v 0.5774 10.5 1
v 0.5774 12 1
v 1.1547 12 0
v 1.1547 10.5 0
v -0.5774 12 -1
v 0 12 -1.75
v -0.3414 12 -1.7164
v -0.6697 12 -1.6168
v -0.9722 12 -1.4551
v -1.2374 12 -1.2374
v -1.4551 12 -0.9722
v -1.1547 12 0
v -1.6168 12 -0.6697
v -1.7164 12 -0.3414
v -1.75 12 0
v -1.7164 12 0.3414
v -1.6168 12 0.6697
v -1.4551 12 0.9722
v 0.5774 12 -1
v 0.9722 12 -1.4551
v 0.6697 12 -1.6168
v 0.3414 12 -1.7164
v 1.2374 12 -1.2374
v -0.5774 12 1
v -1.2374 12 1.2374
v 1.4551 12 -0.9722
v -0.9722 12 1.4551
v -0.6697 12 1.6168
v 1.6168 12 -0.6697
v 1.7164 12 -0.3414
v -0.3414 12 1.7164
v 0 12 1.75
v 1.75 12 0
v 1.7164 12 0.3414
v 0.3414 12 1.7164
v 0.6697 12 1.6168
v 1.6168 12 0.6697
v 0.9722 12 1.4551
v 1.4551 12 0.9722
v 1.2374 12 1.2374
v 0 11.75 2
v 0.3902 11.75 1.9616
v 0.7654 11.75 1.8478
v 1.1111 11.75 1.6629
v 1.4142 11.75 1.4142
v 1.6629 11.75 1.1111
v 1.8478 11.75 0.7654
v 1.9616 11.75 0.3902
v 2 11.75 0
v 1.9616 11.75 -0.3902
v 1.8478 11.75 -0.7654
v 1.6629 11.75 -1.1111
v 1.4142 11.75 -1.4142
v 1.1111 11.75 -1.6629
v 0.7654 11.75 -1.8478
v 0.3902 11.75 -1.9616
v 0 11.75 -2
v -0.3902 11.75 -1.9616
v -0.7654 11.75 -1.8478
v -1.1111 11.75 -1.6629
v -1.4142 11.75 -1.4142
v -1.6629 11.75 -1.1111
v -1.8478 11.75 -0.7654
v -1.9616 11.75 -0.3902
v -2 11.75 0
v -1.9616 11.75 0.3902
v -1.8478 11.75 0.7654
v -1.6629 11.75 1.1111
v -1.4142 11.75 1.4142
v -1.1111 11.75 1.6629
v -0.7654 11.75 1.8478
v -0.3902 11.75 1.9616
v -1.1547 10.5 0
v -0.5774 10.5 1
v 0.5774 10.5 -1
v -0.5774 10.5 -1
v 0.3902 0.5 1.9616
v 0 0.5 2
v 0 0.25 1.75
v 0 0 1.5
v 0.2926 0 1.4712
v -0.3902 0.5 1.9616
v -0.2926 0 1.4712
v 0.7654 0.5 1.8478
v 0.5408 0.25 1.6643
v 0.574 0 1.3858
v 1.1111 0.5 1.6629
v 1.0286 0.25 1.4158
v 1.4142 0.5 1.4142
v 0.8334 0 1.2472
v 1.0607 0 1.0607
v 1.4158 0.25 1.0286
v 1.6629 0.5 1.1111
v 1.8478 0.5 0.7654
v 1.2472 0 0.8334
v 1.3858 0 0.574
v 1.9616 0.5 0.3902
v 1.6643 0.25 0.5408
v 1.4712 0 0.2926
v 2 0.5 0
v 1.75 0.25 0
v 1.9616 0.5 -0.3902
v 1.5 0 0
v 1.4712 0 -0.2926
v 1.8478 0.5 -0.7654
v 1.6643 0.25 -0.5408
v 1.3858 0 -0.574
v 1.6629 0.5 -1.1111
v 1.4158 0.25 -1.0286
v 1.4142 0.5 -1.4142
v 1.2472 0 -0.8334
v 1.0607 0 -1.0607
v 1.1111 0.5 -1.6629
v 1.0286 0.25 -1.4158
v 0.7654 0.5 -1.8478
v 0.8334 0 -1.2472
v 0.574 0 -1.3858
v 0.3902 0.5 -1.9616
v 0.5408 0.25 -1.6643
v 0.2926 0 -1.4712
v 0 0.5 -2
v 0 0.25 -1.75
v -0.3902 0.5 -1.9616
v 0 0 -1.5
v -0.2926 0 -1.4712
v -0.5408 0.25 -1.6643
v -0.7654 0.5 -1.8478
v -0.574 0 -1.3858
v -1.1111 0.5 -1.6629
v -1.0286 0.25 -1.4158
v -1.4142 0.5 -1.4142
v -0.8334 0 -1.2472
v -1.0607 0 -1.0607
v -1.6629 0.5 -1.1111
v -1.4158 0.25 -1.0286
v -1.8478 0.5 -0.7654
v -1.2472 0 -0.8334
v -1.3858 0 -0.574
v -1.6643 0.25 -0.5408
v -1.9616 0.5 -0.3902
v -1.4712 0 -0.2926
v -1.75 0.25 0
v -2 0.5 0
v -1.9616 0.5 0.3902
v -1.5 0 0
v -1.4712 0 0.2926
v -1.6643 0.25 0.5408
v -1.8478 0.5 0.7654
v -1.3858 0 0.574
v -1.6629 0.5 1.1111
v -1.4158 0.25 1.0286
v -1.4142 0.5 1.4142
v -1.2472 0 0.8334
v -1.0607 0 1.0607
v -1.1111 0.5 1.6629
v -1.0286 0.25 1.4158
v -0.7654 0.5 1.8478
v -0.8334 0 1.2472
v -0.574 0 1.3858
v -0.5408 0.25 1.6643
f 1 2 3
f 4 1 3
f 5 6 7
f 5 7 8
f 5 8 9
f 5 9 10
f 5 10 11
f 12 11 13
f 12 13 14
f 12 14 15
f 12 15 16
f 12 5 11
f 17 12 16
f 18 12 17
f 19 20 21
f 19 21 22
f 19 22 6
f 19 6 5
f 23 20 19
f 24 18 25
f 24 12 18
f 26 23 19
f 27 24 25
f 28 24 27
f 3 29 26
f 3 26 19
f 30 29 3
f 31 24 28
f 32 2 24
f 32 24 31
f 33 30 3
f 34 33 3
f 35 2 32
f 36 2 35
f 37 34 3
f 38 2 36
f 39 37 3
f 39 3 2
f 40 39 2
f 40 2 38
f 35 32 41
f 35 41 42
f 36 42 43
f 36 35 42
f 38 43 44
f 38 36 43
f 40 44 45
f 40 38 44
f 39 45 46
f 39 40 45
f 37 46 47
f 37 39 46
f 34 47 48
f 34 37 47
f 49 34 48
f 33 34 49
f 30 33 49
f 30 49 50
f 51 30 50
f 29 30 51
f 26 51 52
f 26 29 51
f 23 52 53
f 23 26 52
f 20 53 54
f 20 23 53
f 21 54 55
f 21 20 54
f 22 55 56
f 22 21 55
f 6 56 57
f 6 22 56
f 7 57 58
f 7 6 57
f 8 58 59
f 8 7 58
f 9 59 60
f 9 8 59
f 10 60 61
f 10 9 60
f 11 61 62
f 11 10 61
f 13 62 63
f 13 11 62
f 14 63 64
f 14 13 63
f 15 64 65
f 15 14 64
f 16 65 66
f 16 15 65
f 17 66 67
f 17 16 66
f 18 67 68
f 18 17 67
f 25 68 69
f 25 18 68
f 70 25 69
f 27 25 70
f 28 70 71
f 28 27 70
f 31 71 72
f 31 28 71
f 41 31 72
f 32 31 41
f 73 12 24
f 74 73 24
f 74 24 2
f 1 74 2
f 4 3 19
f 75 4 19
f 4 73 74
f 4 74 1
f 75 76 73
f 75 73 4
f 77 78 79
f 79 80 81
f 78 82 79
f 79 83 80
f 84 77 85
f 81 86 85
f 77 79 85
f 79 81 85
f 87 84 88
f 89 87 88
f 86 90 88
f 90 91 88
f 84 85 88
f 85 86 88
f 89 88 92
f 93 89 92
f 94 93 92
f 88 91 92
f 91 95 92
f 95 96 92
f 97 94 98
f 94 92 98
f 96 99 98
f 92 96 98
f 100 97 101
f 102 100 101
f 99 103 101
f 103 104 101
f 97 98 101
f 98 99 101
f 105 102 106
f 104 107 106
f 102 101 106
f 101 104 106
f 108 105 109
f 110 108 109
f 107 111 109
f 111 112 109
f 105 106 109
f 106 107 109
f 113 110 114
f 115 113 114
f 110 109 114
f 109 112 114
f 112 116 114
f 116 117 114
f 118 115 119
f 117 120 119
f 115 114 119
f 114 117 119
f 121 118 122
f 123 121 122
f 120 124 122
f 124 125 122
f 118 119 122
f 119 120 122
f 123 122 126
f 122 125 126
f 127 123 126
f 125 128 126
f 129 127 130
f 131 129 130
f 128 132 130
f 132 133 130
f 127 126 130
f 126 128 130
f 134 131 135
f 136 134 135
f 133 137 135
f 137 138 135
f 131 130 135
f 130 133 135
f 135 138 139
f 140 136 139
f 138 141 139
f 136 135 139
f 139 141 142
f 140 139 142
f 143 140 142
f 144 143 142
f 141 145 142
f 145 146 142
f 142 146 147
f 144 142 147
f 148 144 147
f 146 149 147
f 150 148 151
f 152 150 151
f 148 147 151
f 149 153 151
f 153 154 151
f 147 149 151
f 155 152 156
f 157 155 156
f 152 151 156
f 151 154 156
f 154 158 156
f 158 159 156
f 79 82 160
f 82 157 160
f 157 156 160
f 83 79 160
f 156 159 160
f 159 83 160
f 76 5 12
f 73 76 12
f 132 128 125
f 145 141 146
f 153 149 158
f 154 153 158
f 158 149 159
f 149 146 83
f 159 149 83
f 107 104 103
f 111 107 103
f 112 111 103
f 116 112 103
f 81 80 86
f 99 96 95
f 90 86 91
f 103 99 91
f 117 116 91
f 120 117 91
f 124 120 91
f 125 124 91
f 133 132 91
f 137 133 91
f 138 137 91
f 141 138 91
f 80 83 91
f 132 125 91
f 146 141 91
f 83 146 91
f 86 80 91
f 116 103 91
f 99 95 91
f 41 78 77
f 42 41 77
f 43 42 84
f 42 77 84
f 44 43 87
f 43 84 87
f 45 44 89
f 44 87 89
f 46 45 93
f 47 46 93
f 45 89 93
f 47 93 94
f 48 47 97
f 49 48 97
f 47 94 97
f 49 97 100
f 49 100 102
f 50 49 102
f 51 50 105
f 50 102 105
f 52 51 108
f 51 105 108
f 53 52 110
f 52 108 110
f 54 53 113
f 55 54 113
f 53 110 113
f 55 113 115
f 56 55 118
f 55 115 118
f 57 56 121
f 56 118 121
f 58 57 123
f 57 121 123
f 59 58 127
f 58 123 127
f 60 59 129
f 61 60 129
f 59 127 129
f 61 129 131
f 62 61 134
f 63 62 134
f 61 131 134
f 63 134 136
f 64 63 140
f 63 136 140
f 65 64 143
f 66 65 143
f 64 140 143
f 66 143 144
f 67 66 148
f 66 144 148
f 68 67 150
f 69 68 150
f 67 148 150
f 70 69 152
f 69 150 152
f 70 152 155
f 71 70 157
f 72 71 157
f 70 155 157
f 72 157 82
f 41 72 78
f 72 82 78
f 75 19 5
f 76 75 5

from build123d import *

# Parameters (mm, degrees)
SKETCH1_R      = 2
EXTRUDE1_DEPTH = 12
CHAMFER1_SIZE  = 0.25
CHAMFER2_SIZE  = 0.5
EXTRUDE2_DEPTH = 1.5


with BuildPart() as part:
    # Sketch1 → Extrude1 (new body)
    with BuildSketch(Plane(origin=(0, 0, 0), x_dir=(1, 0, 0), z_dir=(0, 1, 0))):
        with Locations(Location((0, 0, 0), (0, 0, 270))):
            Circle(SKETCH1_R)
    extrude(amount=EXTRUDE1_DEPTH)

    # Chamfer1
    chamfer1_edges = [part.edges().sort_by_distance(p)[0] for p in [
        (0, 12, -2),
    ]]
    chamfer(chamfer1_edges, length=CHAMFER1_SIZE)

    # Chamfer2
    chamfer2_edges = [part.edges().sort_by_distance(p)[0] for p in [
        (0, 0, -2),
    ]]
    chamfer(chamfer2_edges, length=CHAMFER2_SIZE)

    # Sketch2 → Extrude2 (cut)
    with BuildSketch(Plane(origin=(0, 12, 0), x_dir=(1, 0, 0), z_dir=(0, 1, 0))):
        Polygon((-1.154700538, 0), (-0.577350269, -1), (0.577350269, -1), (1.154700538, 0), (0.577350269, 1), (-0.577350269, 1), align=None)
    extrude(amount=-EXTRUDE2_DEPTH, mode=Mode.SUBTRACT)


solid = part.part
